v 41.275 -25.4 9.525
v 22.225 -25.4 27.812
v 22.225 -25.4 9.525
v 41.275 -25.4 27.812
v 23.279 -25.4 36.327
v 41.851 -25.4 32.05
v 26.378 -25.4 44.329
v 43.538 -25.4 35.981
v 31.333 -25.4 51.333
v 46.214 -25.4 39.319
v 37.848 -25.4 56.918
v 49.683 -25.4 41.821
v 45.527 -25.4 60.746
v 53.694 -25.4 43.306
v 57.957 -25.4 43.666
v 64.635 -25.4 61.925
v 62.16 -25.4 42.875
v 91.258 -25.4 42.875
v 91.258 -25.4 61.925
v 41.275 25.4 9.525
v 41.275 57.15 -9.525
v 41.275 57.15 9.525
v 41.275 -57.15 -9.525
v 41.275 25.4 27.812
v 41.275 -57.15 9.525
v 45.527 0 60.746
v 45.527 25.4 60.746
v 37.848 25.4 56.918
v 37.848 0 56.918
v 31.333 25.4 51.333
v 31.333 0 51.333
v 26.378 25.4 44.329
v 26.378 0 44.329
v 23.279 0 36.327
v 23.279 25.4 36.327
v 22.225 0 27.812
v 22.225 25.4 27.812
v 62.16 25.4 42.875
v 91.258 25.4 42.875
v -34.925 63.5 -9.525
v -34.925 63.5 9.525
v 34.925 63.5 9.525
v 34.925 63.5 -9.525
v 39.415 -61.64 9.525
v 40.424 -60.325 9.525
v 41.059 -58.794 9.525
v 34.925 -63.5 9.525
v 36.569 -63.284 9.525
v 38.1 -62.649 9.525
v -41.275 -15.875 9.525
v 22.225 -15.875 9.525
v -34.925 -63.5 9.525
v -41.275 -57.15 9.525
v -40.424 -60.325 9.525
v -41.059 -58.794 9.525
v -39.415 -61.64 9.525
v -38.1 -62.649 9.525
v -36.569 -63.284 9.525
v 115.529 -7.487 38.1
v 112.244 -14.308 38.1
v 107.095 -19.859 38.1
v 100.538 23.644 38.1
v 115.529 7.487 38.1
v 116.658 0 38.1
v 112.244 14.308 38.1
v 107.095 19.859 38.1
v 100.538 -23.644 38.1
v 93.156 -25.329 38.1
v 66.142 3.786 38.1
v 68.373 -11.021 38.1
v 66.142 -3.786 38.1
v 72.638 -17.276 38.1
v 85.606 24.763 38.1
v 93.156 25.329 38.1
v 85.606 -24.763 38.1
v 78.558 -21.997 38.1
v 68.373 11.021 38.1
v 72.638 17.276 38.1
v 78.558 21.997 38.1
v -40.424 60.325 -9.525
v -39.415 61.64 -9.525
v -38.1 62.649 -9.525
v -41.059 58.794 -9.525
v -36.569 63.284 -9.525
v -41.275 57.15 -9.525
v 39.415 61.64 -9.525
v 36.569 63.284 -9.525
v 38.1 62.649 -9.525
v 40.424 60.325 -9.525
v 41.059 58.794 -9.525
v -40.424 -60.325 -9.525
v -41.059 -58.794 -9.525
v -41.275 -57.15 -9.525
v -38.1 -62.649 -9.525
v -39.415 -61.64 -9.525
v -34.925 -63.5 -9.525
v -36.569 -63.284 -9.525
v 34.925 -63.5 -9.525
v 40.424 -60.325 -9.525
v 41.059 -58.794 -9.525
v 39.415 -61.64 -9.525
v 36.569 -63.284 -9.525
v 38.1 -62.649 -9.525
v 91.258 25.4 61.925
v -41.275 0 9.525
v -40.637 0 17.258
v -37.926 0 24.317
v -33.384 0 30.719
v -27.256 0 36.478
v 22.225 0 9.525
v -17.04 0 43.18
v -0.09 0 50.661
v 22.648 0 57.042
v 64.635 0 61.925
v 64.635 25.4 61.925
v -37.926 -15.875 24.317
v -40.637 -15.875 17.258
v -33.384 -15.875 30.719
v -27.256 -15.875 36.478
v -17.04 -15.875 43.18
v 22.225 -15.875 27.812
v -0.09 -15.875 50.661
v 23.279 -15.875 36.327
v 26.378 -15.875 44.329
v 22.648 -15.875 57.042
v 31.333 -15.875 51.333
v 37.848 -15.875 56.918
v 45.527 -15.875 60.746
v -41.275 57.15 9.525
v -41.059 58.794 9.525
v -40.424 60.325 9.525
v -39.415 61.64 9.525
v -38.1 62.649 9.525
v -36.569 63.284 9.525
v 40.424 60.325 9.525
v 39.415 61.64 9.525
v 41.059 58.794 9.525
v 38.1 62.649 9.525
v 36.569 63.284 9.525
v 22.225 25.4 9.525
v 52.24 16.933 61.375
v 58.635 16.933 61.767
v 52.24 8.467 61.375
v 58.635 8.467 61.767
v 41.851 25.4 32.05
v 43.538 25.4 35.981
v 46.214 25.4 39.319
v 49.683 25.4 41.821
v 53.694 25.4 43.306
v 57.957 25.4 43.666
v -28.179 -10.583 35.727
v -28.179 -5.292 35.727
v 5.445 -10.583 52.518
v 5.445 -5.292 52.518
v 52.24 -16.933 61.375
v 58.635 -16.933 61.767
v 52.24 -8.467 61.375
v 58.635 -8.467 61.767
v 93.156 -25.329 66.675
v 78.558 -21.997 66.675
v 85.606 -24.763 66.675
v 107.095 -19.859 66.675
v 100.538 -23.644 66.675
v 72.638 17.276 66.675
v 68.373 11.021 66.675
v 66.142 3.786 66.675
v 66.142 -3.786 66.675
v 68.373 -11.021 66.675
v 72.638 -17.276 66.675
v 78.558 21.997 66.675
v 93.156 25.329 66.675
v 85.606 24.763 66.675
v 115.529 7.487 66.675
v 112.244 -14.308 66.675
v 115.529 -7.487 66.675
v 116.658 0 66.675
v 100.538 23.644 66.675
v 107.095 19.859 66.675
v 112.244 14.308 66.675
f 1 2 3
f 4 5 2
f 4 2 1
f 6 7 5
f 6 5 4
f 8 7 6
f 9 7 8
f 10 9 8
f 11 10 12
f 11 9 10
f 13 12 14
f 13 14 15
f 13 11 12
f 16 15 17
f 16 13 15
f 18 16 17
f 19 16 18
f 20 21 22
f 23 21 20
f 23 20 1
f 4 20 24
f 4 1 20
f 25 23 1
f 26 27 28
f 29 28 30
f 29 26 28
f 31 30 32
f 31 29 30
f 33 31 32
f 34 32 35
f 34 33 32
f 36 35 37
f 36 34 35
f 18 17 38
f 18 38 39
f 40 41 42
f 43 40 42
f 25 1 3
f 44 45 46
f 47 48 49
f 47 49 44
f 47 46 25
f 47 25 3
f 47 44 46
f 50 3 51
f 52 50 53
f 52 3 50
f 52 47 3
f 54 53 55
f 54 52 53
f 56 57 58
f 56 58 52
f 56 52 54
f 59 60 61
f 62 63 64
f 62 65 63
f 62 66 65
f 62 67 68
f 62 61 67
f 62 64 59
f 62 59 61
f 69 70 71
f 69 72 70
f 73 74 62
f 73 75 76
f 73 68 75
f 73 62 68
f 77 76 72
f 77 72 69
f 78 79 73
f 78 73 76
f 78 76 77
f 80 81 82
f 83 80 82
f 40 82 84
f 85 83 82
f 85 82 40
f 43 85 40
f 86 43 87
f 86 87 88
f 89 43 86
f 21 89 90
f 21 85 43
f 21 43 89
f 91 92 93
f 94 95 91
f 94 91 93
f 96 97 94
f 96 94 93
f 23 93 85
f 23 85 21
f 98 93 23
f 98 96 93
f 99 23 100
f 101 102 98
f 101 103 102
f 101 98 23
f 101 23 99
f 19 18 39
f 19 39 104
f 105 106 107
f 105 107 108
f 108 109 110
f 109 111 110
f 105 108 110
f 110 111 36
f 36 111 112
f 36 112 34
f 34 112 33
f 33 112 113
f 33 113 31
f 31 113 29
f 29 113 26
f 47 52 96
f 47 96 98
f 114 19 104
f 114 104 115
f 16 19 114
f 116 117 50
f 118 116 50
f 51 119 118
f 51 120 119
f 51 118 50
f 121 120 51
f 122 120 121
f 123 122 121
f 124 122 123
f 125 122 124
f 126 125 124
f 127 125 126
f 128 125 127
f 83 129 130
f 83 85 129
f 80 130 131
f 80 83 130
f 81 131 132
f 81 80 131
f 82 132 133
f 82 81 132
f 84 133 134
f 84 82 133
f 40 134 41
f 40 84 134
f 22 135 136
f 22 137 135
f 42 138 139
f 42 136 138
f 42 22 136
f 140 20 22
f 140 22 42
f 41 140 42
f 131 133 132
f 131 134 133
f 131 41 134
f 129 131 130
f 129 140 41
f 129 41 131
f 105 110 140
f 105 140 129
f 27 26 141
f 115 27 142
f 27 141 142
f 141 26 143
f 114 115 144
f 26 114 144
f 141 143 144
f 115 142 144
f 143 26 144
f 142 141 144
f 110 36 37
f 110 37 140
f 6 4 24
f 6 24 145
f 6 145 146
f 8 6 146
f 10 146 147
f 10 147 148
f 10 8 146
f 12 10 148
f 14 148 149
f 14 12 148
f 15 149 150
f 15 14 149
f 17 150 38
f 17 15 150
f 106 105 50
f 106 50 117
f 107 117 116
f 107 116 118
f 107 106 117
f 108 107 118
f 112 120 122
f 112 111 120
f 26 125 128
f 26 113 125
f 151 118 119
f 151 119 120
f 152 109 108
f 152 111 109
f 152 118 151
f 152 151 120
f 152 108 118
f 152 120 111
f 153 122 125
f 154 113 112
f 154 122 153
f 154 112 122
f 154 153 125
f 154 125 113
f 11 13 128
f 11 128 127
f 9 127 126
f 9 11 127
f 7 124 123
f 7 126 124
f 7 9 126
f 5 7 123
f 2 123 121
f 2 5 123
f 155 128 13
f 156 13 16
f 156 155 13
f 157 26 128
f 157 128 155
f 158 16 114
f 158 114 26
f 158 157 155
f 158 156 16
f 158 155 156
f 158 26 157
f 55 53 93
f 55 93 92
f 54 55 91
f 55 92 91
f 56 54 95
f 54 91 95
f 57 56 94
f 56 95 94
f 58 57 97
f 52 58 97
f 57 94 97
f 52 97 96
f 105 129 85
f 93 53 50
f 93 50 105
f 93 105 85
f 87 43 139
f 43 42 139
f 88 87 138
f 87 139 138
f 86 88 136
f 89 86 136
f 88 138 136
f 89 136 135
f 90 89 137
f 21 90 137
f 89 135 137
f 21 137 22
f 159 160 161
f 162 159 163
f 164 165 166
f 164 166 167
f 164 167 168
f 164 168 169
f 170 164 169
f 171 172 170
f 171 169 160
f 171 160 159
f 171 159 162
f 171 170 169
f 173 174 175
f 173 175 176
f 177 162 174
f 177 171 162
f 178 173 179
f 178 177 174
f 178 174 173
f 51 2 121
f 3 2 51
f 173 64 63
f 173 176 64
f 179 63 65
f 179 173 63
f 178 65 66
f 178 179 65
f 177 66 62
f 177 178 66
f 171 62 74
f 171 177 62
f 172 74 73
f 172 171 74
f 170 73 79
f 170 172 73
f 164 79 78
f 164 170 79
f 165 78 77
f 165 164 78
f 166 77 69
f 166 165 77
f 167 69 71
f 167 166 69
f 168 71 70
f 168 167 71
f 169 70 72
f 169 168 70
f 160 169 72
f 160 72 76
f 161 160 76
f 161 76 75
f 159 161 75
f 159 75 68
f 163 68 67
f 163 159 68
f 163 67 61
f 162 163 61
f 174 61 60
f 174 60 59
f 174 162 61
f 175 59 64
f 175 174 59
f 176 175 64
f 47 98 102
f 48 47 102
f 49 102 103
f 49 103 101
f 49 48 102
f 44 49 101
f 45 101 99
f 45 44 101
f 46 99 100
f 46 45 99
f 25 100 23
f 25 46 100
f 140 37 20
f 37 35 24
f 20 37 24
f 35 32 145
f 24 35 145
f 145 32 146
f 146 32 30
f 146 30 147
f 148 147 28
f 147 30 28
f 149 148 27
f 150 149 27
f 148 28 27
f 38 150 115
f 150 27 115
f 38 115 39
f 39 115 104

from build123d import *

# Parameters (mm, degrees)
F2_DEPTH = 63.5
F0_W     = 25.4
F0_H     = 19.05
F3_DEPTH = 25.4
F4_DEPTH = 15.875
F6_R     = 6.35


with BuildPart() as f2:
    # F0 (on Front) → F2 (new body, symmetric)
    with BuildSketch(Plane.XZ):
        Polygon((41.275, -9.525), (41.275, 9.525), (22.225, 9.525), (-41.275, 9.525), (-41.275, -9.525), align=None)
    extrude(amount=F2_DEPTH, both=True)

    # F0 (on Front) → F3 (join, symmetric)
    with BuildSketch(Plane.XZ):
        with BuildLine():
            Line((22.225, 9.525), (41.275, 9.525))
            Line((41.275, 9.525), (41.275, 27.8116355362))
            ThreePointArc((41.275, 27.8116355362), (47.8635941937, 40.687127457), (62.1604541356, 42.8752))
            Line((62.1604541356, 42.8752), (65.8578989433, 42.8752))
            Line((65.8578989433, 42.8752), (65.8578989433, 61.9252))
            Line((65.8578989433, 61.9252), (64.6346739792, 61.9252))
            add(Edge.make_bspline(
                [(45.5270235405, 60.7458433333), (52.3723696476, 61.4954040628), (58.8590897822, 61.881438389), (64.6346739792, 61.9252)],
                knots=[100.3734396269, 100.3734396269, 100.3734396269, 100.3734396269, 118.1636153916, 118.1636153916, 118.1636153916, 118.1636153916], degree=3))
            ThreePointArc((45.5270235405, 60.7458433333), (28.6395801693, 47.9836851612), (22.225, 27.8116355362))
            Line((22.225, 27.8116355362), (22.225, 9.525))
        make_face()
        with Locations((78.5578989433, 52.4002)):
            Rectangle(F0_W, F0_H)
    extrude(amount=F3_DEPTH, both=True)

    # F0 (on Front) → F4 (join)
    with BuildSketch(Plane.XZ):
        with BuildLine():
            Line((-41.275, 9.525), (22.225, 9.525))
            Line((22.225, 9.525), (22.225, 27.8116355362))
            ThreePointArc((22.225, 27.8116355362), (28.6395801693, 47.9836851612), (45.5270235405, 60.7458433333))
            add(Edge.make_bspline(
                [(-41.275, 9.525), (-43.1329669125, 40.7155687562), (6.9050929142, 56.5167682736), (45.5270235405, 60.7458433333)],
                knots=[0, 0, 0, 0, 100.3734396269, 100.3734396269, 100.3734396269, 100.3734396269], degree=3))
        make_face()
    extrude(amount=F4_DEPTH)

    # F6
    f6_edges = [f2.edges().sort_by_distance(p)[0] for p in [
        (41.275, -63.5, 0),
        (-41.275, -63.5, 0),
        (-41.275, 63.5, 0),
        (41.275, 63.5, 0),
    ]]
    fillet(f6_edges, radius=F6_R)


with BuildPart() as f5:
    # F0 (on Front) → F5 (revolve)
    with BuildSketch(Plane.XZ):
        Polygon((91.2578989433, 61.9252), (91.2578989433, 42.8752), (91.2578989433, 38.1), (116.6578989433, 38.1), (116.6578989433, 66.675), (91.2578989433, 66.675), align=None)
    revolve(axis=Axis((91.2578989433, 0, 52.3875), (0, 0, 1)))


solid = Compound([f2.part, f5.part])
